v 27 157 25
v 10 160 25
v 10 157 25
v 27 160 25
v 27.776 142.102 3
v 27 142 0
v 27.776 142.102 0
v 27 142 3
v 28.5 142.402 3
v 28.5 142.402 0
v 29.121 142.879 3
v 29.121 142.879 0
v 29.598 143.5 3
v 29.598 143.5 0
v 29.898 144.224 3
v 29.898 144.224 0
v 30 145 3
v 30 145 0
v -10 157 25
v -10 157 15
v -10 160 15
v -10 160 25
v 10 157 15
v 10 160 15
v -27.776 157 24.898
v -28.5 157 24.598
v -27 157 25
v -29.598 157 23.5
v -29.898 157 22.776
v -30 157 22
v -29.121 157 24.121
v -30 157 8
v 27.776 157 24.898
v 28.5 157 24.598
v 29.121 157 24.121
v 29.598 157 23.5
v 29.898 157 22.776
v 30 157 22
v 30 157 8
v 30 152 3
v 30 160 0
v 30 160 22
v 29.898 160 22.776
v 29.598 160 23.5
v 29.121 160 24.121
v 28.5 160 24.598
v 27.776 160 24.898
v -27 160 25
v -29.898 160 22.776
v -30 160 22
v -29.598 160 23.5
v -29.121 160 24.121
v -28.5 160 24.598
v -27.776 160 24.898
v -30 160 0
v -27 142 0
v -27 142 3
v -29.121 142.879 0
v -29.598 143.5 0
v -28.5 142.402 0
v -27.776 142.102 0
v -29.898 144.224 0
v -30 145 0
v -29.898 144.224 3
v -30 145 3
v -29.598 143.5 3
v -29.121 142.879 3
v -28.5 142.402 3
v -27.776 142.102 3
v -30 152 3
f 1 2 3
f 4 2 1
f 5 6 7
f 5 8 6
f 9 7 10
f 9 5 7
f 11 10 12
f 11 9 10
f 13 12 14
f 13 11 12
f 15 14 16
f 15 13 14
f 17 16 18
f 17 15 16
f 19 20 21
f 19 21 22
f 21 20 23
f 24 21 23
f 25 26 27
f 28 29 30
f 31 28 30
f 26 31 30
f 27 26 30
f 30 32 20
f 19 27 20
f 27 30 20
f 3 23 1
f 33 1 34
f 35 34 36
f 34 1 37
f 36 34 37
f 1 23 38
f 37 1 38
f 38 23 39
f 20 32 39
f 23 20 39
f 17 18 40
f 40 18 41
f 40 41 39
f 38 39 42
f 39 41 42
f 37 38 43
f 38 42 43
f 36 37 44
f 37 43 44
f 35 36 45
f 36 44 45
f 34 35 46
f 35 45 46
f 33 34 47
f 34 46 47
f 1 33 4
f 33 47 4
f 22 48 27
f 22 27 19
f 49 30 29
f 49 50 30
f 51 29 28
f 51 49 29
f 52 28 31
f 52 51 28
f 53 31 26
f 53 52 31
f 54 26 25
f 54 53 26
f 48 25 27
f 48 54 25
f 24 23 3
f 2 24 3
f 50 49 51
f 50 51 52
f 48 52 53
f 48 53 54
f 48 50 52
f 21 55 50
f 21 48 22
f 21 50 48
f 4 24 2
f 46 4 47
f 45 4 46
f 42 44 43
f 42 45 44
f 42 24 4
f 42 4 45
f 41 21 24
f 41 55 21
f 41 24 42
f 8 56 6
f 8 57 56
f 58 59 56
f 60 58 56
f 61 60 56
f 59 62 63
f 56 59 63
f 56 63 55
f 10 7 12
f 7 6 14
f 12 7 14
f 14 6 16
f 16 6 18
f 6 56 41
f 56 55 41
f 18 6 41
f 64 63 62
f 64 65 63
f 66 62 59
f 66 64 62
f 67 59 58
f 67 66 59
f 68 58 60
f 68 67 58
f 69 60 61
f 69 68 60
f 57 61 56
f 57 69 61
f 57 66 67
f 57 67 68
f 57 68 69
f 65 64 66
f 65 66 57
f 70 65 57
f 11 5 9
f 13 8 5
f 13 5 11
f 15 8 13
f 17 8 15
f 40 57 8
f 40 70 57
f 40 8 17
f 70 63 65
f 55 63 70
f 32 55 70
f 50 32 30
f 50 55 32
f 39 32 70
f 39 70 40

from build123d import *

# Parameters (mm, degrees)
SKETCH1_W           = 60
SKETCH1_H           = 3
BOSS_EXTRUDE1_DEPTH = 25
SKETCH2_W           = 60
SKETCH2_H           = 3
BOSS_EXTRUDE2_DEPTH = 15
SKETCH3_W           = 20
SKETCH3_H           = 10
CUT_EXTRUDE1_DEPTH  = 42.833001327
FILLET1_R           = 3
CHAMFER1_SIZE       = 5


with BuildPart() as part:
    # Sketch1 → Boss-Extrude1 (new body)
    with BuildSketch(Plane.XY):
        with Locations((0, 158.5)):
            Rectangle(SKETCH1_W, SKETCH1_H)
    extrude(amount=BOSS_EXTRUDE1_DEPTH)

    # Sketch2 → Boss-Extrude2 (add)
    with BuildSketch(Plane.XZ.offset(-157)):
        with Locations((0, 1.5)):
            Rectangle(SKETCH2_W, SKETCH2_H)
    extrude(amount=BOSS_EXTRUDE2_DEPTH)

    # Sketch3 → Cut-Extrude1 (cut, through all)
    with BuildSketch(Plane.XZ.offset(-157)):
        with Locations((0, 20)):
            Rectangle(SKETCH3_W, SKETCH3_H)
    extrude(amount=-CUT_EXTRUDE1_DEPTH, mode=Mode.SUBTRACT)

    # Fillet1
    fillet1_edges = [part.edges().sort_by_distance(p)[0] for p in [
        (30, 158.5, 25),
        (-30, 142, 1.5),
        (30, 142, 1.5),
        (-30, 158.5, 25),
    ]]
    fillet(fillet1_edges, radius=FILLET1_R)

    # Chamfer1
    chamfer1_edges = [part.edges().sort_by_distance(p)[0] for p in [
        (0, 157, 3),
    ]]
    chamfer(chamfer1_edges, length=CHAMFER1_SIZE)


solid = part.part
